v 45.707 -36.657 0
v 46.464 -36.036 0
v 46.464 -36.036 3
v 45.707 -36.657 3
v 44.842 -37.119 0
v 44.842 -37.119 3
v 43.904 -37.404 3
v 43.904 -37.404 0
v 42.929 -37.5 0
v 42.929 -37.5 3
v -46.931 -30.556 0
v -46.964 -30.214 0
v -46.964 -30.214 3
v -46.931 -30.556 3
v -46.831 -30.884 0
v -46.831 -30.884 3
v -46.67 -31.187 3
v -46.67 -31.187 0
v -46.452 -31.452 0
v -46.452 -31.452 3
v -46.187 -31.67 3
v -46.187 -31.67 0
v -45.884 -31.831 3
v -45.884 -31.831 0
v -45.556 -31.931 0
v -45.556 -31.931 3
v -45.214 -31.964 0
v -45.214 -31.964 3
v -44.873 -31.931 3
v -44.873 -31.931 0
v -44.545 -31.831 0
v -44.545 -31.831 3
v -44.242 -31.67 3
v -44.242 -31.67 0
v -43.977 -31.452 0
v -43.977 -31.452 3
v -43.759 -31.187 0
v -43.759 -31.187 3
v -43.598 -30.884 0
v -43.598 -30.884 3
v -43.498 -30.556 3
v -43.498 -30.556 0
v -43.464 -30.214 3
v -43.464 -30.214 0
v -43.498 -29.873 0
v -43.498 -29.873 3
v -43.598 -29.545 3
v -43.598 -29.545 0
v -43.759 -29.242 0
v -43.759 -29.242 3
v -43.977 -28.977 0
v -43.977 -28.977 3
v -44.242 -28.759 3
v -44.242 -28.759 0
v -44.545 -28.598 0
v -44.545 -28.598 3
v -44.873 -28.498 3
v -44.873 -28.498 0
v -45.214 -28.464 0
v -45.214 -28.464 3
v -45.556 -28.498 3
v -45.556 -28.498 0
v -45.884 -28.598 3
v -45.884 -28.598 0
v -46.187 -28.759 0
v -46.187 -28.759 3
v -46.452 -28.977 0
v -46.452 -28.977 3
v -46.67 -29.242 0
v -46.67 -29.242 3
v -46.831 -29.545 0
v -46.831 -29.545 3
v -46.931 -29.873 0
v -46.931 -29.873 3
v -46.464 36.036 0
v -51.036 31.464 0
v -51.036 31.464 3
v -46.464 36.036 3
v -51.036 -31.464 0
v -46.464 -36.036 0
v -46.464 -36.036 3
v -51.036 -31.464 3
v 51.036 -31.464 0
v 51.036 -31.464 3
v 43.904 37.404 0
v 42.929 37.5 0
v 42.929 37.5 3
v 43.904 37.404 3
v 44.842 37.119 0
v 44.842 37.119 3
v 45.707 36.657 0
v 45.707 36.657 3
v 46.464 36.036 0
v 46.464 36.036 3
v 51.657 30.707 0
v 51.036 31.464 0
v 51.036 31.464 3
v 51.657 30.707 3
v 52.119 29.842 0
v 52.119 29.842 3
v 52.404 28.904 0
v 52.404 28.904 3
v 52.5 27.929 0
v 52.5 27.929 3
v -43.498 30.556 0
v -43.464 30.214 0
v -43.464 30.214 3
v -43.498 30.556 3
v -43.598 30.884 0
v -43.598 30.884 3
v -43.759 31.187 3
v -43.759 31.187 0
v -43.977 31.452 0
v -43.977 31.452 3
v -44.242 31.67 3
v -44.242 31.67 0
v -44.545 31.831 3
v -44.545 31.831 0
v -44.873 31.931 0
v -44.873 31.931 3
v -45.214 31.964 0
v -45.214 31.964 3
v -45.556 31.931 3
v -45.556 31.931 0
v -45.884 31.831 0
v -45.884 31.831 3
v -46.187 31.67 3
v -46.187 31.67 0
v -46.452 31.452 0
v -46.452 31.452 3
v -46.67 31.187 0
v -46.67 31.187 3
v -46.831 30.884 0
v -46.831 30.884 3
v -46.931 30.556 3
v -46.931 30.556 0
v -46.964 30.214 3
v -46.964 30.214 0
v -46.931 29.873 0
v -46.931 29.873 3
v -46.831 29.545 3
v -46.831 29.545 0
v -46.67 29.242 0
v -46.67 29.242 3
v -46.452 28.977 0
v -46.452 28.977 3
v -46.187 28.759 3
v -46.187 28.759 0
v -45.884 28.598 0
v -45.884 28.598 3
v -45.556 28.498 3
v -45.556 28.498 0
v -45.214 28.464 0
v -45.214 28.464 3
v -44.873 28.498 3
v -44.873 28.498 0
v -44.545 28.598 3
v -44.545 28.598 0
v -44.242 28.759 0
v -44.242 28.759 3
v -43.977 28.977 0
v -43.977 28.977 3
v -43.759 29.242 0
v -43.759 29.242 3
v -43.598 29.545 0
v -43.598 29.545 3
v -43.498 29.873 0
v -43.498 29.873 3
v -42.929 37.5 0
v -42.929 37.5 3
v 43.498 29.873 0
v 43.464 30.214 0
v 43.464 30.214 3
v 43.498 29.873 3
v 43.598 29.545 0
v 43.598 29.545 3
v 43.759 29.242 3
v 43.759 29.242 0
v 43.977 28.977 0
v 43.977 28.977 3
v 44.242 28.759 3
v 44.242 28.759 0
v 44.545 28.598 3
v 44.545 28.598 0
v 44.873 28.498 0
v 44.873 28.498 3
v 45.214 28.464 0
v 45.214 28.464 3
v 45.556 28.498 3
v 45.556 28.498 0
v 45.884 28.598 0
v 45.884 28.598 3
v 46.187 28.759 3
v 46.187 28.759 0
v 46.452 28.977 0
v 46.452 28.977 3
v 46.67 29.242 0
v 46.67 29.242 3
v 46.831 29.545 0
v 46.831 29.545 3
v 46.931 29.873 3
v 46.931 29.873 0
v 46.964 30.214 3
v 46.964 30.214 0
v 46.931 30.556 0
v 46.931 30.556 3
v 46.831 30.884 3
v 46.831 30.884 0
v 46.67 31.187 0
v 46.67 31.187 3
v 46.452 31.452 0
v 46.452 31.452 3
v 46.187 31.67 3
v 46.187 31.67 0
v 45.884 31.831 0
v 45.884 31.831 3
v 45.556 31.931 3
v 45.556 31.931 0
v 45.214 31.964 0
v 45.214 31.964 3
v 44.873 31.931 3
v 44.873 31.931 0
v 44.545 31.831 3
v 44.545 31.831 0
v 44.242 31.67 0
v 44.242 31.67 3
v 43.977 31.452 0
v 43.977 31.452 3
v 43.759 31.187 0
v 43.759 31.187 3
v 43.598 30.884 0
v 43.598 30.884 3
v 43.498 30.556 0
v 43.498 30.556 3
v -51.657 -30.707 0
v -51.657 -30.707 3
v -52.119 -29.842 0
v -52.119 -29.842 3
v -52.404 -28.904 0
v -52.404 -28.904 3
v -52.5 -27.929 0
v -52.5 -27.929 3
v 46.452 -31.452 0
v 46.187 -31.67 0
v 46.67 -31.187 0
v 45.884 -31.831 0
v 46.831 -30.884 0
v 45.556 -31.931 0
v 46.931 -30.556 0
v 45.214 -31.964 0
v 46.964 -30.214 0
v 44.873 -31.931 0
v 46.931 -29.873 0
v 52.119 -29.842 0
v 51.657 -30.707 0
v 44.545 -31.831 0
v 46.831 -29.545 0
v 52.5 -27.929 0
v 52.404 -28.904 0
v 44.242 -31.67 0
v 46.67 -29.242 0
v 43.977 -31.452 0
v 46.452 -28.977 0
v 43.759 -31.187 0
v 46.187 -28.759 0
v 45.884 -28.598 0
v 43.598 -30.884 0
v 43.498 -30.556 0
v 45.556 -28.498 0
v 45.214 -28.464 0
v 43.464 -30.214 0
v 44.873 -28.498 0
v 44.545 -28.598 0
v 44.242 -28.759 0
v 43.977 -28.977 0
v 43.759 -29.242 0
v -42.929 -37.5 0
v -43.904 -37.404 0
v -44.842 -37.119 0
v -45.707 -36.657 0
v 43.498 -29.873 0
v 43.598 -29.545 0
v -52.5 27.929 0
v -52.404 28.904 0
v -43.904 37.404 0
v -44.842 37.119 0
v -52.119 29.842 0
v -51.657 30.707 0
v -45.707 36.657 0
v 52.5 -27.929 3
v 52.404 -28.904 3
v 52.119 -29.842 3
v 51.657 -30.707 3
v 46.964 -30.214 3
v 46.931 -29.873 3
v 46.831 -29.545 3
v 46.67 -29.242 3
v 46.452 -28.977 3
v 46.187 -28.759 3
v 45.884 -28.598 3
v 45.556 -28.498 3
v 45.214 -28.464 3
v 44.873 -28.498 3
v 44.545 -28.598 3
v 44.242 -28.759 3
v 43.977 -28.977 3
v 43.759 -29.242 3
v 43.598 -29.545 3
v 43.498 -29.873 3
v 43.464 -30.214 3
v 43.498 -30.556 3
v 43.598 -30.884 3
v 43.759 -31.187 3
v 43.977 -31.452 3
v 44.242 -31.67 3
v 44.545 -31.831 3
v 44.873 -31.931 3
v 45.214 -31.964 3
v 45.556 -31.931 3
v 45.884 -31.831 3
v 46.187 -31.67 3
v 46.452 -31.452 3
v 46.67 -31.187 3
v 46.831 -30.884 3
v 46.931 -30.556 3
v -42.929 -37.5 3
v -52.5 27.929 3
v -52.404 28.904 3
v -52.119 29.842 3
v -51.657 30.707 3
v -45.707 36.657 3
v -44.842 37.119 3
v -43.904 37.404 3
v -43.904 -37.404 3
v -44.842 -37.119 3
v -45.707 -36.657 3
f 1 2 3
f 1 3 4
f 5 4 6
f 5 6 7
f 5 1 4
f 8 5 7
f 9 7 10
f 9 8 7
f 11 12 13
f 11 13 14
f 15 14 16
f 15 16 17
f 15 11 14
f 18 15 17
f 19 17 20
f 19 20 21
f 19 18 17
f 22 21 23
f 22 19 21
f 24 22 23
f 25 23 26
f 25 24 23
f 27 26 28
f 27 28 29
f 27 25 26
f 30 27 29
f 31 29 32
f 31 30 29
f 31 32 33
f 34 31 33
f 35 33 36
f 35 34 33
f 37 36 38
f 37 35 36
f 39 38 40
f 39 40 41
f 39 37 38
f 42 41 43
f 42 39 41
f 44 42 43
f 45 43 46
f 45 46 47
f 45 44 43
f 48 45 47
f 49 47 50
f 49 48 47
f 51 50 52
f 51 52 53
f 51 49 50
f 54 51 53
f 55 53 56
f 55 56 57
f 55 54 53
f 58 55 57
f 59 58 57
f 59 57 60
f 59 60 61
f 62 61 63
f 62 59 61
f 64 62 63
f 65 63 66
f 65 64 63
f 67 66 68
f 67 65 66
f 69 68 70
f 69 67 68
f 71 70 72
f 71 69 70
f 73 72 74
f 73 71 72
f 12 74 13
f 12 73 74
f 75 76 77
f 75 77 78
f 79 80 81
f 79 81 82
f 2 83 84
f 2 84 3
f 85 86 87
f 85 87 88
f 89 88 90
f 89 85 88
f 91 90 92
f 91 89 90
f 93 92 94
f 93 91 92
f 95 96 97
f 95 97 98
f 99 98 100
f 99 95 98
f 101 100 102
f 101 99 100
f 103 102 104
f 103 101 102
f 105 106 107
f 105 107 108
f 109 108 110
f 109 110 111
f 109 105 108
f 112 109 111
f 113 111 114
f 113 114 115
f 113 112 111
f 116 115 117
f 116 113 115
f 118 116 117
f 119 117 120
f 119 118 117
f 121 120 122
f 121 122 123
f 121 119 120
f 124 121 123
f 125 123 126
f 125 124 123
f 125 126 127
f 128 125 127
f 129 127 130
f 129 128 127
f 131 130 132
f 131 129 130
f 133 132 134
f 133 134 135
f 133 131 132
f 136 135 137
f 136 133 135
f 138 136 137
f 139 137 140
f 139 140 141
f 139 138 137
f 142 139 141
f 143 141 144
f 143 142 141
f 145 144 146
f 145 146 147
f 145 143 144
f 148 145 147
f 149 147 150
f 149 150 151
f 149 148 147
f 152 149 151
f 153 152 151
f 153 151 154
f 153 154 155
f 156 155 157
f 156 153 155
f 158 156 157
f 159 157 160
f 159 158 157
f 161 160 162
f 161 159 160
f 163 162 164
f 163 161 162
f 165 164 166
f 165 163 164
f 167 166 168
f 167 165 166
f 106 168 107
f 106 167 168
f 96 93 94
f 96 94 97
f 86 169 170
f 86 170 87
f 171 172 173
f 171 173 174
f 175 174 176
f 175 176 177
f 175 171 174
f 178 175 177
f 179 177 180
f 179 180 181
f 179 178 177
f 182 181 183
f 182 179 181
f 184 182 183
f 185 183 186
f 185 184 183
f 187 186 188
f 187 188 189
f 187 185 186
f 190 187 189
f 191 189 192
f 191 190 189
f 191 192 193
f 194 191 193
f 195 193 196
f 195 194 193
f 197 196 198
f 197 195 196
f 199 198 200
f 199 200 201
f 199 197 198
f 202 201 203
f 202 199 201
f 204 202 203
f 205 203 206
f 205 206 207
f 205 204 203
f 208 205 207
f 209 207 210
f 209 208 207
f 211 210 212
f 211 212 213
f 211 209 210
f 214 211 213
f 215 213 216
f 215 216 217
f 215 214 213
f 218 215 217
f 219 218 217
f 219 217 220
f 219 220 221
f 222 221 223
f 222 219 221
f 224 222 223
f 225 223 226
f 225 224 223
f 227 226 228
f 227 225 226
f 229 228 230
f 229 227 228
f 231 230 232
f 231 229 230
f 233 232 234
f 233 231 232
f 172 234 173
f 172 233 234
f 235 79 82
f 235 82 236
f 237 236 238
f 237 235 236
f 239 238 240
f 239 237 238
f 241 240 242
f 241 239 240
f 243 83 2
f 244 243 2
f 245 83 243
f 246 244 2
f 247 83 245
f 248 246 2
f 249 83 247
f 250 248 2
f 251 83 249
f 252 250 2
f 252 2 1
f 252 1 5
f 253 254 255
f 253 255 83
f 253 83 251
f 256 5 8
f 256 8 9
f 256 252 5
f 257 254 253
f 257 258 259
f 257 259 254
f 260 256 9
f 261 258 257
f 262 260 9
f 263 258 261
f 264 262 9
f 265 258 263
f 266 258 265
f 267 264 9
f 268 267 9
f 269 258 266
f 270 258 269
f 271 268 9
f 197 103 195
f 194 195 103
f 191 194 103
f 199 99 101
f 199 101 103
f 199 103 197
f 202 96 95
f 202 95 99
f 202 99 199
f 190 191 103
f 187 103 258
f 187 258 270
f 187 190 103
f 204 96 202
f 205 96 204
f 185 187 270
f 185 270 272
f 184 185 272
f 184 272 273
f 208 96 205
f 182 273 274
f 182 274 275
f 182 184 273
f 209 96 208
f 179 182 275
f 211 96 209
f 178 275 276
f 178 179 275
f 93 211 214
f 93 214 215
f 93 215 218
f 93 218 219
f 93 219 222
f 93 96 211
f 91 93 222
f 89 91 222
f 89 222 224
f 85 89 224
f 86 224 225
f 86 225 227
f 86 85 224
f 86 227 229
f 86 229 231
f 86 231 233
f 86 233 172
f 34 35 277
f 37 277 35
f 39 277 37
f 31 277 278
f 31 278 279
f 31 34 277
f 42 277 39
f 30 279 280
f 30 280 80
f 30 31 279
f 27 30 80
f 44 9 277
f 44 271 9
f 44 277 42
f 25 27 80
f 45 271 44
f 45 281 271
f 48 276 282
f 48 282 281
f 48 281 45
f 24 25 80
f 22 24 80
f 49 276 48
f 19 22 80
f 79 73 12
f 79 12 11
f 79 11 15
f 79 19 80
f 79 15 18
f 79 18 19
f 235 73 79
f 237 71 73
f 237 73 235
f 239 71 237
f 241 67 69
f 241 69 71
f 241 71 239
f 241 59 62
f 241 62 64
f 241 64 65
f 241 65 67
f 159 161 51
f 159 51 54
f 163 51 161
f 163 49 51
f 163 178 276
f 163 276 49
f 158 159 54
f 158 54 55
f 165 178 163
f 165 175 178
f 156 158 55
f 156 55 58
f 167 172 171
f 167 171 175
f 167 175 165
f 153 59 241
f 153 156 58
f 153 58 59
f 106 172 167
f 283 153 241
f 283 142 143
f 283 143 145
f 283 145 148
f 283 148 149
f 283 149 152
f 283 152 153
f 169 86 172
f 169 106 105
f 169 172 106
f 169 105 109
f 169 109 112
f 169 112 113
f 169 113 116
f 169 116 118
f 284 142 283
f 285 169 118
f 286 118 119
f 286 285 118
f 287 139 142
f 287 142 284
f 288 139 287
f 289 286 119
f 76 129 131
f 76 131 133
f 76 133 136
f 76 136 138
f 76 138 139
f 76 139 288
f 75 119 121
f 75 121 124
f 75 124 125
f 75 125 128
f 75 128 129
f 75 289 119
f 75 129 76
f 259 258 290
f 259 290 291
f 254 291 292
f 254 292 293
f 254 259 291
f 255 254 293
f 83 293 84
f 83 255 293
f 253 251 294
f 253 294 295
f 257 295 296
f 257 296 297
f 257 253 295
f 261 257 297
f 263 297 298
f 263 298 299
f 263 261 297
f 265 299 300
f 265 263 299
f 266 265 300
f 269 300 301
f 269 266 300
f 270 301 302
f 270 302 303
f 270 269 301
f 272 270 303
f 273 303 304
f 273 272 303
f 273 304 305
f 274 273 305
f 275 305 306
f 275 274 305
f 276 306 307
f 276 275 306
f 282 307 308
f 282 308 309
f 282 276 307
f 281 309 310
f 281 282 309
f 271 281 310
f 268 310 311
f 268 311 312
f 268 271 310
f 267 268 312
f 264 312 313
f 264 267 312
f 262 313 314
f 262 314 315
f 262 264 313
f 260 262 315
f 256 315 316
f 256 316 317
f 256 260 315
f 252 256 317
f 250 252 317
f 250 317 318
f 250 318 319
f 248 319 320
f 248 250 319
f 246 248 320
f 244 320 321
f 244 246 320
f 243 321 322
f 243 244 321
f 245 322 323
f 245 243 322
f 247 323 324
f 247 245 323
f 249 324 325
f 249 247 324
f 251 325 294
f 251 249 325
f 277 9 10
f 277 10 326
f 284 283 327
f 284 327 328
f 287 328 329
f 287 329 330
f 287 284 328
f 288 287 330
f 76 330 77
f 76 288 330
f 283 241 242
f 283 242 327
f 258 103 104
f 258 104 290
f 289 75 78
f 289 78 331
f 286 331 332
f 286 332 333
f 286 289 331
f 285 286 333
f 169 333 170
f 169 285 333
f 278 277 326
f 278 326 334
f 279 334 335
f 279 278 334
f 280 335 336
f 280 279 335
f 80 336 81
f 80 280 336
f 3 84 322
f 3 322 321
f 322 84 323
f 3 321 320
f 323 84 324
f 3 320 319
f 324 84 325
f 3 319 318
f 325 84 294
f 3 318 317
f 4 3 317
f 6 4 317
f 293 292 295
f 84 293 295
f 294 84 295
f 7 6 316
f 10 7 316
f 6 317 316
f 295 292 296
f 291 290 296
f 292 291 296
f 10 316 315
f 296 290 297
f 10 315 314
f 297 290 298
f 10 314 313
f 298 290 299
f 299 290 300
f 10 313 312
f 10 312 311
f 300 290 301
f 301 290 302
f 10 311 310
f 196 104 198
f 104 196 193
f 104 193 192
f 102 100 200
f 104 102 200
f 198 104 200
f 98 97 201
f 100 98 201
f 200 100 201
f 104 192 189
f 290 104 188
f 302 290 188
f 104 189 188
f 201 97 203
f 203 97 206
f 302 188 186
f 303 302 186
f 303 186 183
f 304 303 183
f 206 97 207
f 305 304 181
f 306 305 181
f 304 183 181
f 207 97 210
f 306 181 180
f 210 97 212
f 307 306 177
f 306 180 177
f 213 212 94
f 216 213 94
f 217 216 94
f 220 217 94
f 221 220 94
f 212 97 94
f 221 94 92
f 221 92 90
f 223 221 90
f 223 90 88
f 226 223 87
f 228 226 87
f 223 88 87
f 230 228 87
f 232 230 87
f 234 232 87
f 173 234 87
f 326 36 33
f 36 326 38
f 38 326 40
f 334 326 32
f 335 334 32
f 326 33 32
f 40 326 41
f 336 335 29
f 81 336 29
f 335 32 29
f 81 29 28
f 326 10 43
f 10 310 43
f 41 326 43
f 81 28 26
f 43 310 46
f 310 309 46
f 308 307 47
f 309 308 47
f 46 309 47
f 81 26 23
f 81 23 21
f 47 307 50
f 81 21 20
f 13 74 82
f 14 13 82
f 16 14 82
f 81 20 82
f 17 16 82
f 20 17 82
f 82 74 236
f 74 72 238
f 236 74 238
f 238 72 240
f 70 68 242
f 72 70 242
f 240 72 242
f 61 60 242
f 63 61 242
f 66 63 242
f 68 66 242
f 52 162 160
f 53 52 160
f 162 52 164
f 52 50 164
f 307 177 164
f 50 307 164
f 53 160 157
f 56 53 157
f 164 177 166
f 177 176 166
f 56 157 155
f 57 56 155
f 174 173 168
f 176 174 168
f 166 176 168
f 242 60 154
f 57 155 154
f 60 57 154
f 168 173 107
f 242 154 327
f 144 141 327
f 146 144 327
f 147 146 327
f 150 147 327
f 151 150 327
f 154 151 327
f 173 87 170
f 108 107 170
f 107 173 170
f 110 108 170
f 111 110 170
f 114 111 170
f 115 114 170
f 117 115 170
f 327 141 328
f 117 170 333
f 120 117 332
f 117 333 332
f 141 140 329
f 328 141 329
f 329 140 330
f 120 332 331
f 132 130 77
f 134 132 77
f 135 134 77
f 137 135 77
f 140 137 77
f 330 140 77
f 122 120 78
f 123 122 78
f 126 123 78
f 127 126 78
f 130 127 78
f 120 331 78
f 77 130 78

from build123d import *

# Parameters (mm, degrees)
SKETCH_1_R      = 1.75
EXTRUDE_1_DEPTH = 3


with BuildPart() as part:
    # Эскиз1 → Бобышка-Вытянуть1 (new body)
    with BuildSketch(Plane.XY):
        with BuildLine():
            Line((-51.035533906, 31.464466094), (-46.464466094, 36.035533906))
            ThreePointArc((-46.464466094, 36.035533906), (-44.84234935, 37.119397663), (-42.928932188, 37.5))
            Line((-42.928932188, 37.5), (42.928932188, 37.5))
            ThreePointArc((42.928932188, 37.5), (44.84234935, 37.119397663), (46.464466094, 36.035533906))
            Line((46.464466094, 36.035533906), (51.035533906, 31.464466094))
            ThreePointArc((51.035533906, 31.464466094), (52.119397663, 29.84234935), (52.5, 27.928932188))
            Line((52.5, 27.928932188), (52.5, -27.928932188))
            ThreePointArc((52.5, -27.928932188), (52.119397663, -29.84234935), (51.035533906, -31.464466094))
            Line((51.035533906, -31.464466094), (46.464466094, -36.035533906))
            ThreePointArc((46.464466094, -36.035533906), (44.84234935, -37.119397663), (42.928932188, -37.5))
            Line((42.928932188, -37.5), (-42.928932188, -37.5))
            ThreePointArc((-42.928932188, -37.5), (-44.84234935, -37.119397663), (-46.464466094, -36.035533906))
            Line((-46.464466094, -36.035533906), (-51.035533906, -31.464466094))
            ThreePointArc((-51.035533906, -31.464466094), (-52.119397663, -29.84234935), (-52.5, -27.928932188))
            Line((-52.5, -27.928932188), (-52.5, 27.928932188))
            ThreePointArc((-52.5, 27.928932188), (-52.119397663, 29.84234935), (-51.035533906, 31.464466094))
        make_face()
        with Locations((-45.214466094, 30.214466094)):
            Circle(SKETCH_1_R, mode=Mode.SUBTRACT)
        with Locations(Location((-45.214466094, -30.214466094, 0), (0, 0, 180))):
            Circle(SKETCH_1_R, mode=Mode.SUBTRACT)
        with Locations((45.214466094, -30.214466094)):
            Circle(SKETCH_1_R, mode=Mode.SUBTRACT)
        with Locations(Location((45.214466094, 30.214466094, 0), (0, 0, 180))):
            Circle(SKETCH_1_R, mode=Mode.SUBTRACT)
    extrude(amount=EXTRUDE_1_DEPTH)


solid = part.part
